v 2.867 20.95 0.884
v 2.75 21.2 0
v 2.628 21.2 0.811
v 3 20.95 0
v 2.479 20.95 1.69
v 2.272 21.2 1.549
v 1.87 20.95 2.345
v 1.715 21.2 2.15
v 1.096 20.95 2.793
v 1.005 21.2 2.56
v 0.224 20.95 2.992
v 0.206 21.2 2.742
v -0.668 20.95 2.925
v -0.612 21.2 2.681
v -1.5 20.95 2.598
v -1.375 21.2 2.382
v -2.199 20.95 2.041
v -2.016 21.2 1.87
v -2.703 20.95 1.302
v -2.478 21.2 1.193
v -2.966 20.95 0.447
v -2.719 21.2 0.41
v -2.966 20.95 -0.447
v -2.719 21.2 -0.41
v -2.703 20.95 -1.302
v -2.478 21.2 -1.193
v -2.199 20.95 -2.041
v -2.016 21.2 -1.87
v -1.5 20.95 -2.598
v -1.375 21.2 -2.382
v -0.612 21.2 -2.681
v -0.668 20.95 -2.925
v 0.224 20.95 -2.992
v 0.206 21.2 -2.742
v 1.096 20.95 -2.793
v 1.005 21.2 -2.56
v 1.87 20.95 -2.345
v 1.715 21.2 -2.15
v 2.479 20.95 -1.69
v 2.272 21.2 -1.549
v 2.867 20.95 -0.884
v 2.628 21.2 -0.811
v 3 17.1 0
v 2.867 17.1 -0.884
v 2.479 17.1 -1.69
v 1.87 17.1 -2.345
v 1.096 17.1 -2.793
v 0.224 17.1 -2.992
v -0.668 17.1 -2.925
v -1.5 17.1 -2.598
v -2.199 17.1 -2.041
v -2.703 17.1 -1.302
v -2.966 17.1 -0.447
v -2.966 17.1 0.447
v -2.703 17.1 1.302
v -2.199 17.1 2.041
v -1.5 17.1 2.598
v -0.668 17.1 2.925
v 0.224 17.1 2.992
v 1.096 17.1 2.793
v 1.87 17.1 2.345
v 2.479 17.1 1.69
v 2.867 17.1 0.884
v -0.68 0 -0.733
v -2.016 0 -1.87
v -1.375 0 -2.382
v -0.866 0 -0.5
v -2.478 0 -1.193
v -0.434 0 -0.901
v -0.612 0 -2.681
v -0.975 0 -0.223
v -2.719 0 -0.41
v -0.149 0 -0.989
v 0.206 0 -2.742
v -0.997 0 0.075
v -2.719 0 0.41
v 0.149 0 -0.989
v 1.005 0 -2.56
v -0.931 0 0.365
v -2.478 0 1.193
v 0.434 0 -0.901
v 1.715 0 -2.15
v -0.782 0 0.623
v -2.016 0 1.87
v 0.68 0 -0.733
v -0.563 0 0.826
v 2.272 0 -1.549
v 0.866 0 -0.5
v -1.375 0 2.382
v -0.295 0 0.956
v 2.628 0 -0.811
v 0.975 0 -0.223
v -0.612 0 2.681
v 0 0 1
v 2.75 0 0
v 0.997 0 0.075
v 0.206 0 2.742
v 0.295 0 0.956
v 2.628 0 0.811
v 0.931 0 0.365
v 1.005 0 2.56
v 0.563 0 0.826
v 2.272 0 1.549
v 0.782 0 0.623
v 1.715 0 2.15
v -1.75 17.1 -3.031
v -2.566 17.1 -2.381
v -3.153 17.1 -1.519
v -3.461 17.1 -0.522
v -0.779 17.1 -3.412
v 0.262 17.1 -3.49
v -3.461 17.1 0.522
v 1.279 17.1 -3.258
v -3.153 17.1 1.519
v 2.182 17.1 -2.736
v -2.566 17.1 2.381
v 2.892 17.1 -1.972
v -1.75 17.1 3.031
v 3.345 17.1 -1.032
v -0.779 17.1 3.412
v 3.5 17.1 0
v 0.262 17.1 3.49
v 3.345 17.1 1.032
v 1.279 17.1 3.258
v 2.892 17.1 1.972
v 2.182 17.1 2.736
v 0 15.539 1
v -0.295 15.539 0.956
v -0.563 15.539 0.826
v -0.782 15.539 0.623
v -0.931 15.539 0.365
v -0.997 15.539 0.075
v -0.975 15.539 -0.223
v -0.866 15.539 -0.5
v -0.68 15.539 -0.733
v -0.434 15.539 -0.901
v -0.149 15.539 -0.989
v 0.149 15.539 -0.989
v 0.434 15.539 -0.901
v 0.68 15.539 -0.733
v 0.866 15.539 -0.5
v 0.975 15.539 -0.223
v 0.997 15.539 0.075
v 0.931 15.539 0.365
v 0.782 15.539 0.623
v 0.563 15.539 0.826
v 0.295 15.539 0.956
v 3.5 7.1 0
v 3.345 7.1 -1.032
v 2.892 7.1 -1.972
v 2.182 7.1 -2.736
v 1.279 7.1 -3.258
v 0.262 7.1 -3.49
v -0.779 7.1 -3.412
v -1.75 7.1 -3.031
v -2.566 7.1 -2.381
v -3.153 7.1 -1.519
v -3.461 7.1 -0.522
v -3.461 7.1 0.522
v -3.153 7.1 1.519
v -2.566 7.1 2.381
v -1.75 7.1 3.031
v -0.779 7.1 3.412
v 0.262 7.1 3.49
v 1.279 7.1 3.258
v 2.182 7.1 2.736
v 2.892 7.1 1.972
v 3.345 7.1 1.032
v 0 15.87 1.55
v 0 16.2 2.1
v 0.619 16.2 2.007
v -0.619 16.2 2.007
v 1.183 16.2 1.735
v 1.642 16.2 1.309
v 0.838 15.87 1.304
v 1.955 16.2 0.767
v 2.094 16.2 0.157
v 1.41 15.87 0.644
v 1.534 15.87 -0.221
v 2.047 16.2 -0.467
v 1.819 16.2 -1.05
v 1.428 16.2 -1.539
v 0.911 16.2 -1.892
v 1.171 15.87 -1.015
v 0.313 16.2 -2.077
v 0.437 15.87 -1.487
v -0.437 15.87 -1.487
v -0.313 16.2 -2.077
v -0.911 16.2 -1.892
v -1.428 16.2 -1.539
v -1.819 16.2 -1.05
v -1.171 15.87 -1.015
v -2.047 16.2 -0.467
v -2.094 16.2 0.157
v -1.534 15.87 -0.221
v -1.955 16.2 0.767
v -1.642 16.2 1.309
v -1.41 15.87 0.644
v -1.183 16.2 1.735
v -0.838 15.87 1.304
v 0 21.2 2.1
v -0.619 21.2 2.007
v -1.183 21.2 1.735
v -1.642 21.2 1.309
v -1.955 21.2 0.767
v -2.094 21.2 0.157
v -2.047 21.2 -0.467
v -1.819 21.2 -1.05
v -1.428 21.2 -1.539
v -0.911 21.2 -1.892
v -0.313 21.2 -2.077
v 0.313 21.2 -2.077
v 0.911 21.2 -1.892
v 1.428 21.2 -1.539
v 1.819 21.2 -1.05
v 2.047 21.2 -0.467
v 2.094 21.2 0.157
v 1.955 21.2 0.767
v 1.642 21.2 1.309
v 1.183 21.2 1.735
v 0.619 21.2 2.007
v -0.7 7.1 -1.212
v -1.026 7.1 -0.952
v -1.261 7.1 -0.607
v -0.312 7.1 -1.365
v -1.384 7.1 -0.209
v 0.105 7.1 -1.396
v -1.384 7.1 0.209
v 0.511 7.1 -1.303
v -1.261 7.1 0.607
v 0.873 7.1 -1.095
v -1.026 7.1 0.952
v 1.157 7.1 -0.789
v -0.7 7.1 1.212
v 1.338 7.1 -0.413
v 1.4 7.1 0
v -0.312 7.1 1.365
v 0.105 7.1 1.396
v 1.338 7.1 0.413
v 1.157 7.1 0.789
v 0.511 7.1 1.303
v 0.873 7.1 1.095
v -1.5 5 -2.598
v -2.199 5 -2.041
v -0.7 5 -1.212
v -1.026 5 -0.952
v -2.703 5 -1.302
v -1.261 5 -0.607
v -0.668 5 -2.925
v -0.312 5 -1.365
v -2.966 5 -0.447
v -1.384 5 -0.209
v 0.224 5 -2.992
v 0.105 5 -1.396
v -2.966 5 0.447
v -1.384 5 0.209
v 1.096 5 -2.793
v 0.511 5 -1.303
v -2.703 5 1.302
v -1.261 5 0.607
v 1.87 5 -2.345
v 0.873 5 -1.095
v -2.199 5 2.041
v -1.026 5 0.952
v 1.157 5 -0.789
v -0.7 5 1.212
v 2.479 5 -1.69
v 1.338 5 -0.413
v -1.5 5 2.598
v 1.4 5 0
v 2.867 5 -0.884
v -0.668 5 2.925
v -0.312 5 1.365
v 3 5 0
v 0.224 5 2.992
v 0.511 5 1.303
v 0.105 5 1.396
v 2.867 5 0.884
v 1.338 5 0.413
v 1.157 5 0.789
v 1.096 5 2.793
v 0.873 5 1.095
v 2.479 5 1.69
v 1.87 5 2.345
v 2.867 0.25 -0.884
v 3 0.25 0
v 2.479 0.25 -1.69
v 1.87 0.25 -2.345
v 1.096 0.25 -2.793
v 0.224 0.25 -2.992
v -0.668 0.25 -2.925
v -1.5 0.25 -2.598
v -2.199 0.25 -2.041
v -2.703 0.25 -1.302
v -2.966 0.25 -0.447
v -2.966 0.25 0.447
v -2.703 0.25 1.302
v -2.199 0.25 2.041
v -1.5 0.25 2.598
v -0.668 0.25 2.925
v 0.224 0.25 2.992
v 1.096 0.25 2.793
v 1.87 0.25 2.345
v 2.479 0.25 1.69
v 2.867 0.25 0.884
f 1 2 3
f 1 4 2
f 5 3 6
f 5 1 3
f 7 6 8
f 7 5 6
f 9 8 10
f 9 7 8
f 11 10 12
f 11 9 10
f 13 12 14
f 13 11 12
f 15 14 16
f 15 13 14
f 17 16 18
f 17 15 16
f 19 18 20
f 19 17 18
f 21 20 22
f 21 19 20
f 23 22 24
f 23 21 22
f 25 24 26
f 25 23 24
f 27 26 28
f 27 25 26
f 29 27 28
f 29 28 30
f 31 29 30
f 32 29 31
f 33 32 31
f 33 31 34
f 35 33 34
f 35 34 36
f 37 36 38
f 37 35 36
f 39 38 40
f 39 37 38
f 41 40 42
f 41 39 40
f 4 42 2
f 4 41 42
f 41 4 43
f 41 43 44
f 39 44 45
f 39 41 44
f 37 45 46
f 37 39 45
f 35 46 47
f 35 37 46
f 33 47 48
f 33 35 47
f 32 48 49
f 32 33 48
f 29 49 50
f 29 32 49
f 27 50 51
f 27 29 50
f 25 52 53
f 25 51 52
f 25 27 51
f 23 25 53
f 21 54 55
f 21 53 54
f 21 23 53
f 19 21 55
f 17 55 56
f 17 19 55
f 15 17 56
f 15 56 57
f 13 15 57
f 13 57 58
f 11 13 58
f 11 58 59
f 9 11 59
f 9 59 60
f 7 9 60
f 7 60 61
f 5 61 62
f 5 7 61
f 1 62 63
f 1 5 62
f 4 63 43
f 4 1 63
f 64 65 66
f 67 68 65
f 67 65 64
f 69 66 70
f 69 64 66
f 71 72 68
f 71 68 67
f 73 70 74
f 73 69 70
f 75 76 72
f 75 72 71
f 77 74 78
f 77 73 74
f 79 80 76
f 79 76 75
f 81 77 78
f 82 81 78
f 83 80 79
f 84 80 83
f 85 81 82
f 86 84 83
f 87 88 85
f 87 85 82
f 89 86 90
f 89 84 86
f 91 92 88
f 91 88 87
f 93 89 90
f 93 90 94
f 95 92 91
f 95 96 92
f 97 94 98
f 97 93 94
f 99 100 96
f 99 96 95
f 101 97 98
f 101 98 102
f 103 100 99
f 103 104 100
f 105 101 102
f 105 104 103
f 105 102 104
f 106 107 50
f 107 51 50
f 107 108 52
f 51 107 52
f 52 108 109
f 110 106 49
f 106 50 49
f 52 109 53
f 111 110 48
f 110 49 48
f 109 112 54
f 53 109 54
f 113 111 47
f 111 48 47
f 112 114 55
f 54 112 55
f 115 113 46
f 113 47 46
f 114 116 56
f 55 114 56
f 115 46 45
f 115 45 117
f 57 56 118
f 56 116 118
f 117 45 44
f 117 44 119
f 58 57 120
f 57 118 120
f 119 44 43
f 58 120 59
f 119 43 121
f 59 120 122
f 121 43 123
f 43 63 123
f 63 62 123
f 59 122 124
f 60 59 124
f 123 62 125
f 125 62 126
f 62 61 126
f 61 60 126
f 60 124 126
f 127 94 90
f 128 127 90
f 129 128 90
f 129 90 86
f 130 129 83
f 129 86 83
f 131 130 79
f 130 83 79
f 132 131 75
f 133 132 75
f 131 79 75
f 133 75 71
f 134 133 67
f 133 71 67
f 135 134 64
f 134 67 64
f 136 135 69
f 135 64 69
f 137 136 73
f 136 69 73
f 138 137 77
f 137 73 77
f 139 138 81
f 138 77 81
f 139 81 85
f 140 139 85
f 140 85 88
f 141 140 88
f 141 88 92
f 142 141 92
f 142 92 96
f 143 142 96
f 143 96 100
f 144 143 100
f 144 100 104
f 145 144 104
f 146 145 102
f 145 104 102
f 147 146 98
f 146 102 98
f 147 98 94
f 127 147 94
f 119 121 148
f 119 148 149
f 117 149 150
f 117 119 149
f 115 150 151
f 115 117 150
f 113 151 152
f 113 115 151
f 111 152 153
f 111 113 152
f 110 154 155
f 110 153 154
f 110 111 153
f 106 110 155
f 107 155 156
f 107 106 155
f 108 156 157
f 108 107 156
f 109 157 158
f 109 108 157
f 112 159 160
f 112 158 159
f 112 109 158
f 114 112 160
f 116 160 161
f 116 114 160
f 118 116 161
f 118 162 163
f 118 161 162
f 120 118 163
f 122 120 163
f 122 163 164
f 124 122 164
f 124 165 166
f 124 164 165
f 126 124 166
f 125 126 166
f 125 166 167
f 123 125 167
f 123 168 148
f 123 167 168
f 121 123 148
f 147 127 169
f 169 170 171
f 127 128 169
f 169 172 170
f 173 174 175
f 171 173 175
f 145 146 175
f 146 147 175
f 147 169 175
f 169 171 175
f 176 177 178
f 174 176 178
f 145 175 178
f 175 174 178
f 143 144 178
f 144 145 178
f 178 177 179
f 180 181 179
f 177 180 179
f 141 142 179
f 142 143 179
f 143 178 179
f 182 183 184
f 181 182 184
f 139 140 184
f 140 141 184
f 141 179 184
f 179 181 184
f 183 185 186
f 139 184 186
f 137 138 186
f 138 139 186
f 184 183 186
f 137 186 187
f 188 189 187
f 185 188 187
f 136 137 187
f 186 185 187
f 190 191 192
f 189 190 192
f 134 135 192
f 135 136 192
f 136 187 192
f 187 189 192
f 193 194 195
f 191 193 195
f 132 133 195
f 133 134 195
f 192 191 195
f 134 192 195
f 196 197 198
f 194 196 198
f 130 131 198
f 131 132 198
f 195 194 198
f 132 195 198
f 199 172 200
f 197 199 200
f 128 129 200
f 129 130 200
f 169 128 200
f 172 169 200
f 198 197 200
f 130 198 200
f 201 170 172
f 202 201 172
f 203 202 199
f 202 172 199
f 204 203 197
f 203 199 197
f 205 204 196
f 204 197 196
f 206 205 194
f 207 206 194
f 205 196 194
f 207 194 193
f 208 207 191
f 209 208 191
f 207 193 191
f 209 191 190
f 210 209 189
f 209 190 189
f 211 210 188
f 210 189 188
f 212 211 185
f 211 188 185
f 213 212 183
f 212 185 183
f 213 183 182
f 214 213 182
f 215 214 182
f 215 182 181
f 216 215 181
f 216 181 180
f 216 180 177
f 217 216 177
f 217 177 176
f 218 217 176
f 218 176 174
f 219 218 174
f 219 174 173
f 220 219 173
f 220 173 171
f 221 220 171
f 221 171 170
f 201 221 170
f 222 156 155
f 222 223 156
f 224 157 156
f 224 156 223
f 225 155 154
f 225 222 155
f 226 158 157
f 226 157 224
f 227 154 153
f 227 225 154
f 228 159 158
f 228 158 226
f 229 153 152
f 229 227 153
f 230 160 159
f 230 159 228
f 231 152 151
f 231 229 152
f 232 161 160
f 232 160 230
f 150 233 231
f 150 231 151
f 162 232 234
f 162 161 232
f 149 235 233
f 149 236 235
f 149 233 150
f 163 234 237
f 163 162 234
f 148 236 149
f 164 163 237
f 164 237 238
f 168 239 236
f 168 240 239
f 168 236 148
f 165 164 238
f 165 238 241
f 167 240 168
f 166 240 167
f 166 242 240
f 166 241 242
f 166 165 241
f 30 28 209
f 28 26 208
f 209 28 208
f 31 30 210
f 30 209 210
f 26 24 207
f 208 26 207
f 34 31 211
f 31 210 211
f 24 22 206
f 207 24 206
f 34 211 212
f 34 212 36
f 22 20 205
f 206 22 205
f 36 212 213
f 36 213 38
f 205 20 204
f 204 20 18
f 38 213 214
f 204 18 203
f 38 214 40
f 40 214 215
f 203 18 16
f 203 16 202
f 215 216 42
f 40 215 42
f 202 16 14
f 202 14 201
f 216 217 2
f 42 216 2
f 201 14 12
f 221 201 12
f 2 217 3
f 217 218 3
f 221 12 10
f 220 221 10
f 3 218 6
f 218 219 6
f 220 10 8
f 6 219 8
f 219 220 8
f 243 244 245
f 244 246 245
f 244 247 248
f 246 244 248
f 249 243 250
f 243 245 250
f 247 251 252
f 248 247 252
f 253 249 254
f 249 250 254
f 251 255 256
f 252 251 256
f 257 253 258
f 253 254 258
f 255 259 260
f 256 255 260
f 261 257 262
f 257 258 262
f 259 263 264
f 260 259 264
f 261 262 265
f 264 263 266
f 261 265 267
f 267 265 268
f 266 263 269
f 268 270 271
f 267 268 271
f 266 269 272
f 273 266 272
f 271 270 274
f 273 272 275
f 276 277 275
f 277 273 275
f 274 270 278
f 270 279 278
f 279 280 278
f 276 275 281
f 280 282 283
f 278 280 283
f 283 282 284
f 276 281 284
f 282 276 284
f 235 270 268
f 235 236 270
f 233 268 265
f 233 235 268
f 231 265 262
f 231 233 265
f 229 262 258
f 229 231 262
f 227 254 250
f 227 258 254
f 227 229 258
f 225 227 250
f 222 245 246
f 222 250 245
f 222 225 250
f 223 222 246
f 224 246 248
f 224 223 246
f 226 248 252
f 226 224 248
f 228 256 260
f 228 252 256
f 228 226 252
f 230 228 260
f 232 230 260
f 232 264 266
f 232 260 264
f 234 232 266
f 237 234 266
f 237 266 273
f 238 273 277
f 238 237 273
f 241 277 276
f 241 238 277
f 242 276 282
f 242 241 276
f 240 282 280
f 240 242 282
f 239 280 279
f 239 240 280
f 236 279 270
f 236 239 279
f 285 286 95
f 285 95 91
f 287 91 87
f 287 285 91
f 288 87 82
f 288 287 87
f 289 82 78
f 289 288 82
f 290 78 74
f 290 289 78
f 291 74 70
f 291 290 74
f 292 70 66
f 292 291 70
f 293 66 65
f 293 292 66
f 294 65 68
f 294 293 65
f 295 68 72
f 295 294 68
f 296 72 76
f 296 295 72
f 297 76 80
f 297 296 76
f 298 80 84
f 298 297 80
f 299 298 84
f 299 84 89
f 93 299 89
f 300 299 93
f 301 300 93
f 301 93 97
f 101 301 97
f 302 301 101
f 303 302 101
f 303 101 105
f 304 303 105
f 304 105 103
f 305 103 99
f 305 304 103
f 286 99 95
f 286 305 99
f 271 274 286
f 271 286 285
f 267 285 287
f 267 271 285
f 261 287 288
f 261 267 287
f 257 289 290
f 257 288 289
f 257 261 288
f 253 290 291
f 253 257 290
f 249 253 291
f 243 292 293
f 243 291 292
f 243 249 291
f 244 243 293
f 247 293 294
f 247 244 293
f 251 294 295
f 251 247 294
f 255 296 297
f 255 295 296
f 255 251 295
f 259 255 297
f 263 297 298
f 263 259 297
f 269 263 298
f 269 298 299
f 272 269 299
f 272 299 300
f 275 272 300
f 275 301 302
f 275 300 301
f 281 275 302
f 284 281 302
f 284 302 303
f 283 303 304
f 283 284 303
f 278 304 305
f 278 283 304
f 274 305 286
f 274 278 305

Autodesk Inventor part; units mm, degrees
ref_plane "YZ Plane" through (0, 0, 0) normal (1, 0, 0) x (0, 1, 0)
ref_plane "XZ Plane" through (0, 0, 0) normal (0, 1, 0) x (-1, 0, 0)
ref_plane "XY Plane" through (0, 0, 0) normal (0, 0, 1) x (1, 0, 0)
sketch "Sketch1" plane through (0, 0, 0) normal (0, 0, 1) x (1, 0, 0)
  line L0 (0, 0) -> (3, 0)
  line L1 (3, 0) -> (3, 5)
  line L2 (3, 5) -> (1.4, 5)
  line L3 (1.4, 5) -> (1.4, 7.1)
  line L4 (1.4, 7.1) -> (3.5, 7.1)
  line L5 (3.5, 7.1) -> (3.5, 17.1)
  line L6 (3.5, 17.1) -> (3, 17.1)
  line L7 (3, 17.1) -> (3, 21.2)
  line L8 (3, 21.2) -> (0, 21.2)
  line L9 (0, 21.2) -> (0, 0)
  dimension "d0" = 2.1
  dimension "d1" = 7.1
  dimension "d3" = 10
  dimension "d4" = 14.1
  dimension "d5" = 3
  dimension "d6" = 1.4
  dimension "d7" = 3.5
  dimension "d8" = 3
revolve "Revolution1" add sketch "Sketch1" angle 360 about axis through (0, 21.2, 0) along (0, -1, 0)
thread "Thread1" size "M7x1" class "6g" standard "ANSI Metric M Profile" full length
thread "Thread2" size "M6x1" class "6g" standard "ANSI Metric M Profile" full length
sketch "Sketch2" plane through (0, 21.2, 0) normal (0, 1, 0) x (1, 0, 0)
  circle A0 centre (0, 0) radius 3 projected
  point P0 (0, 0)
hole "Hole1" at (0, 21.2, 0) direction (0, -1, 0) diameter 2 end through all
hole "Hole2" at (0, 21.2, 0) direction (0, -1, 0) diameter 4.2 depth 5 tip angle 118
chamfer "Chamfer1" distance 0.25 angle 45 1 edges at (-3, 21.2, 0)
chamfer "Chamfer2" distance 0.25 angle 45 1 edges at (-3, 0, 0)
properties part number "Heatbreak" material "Stainless Steel"
